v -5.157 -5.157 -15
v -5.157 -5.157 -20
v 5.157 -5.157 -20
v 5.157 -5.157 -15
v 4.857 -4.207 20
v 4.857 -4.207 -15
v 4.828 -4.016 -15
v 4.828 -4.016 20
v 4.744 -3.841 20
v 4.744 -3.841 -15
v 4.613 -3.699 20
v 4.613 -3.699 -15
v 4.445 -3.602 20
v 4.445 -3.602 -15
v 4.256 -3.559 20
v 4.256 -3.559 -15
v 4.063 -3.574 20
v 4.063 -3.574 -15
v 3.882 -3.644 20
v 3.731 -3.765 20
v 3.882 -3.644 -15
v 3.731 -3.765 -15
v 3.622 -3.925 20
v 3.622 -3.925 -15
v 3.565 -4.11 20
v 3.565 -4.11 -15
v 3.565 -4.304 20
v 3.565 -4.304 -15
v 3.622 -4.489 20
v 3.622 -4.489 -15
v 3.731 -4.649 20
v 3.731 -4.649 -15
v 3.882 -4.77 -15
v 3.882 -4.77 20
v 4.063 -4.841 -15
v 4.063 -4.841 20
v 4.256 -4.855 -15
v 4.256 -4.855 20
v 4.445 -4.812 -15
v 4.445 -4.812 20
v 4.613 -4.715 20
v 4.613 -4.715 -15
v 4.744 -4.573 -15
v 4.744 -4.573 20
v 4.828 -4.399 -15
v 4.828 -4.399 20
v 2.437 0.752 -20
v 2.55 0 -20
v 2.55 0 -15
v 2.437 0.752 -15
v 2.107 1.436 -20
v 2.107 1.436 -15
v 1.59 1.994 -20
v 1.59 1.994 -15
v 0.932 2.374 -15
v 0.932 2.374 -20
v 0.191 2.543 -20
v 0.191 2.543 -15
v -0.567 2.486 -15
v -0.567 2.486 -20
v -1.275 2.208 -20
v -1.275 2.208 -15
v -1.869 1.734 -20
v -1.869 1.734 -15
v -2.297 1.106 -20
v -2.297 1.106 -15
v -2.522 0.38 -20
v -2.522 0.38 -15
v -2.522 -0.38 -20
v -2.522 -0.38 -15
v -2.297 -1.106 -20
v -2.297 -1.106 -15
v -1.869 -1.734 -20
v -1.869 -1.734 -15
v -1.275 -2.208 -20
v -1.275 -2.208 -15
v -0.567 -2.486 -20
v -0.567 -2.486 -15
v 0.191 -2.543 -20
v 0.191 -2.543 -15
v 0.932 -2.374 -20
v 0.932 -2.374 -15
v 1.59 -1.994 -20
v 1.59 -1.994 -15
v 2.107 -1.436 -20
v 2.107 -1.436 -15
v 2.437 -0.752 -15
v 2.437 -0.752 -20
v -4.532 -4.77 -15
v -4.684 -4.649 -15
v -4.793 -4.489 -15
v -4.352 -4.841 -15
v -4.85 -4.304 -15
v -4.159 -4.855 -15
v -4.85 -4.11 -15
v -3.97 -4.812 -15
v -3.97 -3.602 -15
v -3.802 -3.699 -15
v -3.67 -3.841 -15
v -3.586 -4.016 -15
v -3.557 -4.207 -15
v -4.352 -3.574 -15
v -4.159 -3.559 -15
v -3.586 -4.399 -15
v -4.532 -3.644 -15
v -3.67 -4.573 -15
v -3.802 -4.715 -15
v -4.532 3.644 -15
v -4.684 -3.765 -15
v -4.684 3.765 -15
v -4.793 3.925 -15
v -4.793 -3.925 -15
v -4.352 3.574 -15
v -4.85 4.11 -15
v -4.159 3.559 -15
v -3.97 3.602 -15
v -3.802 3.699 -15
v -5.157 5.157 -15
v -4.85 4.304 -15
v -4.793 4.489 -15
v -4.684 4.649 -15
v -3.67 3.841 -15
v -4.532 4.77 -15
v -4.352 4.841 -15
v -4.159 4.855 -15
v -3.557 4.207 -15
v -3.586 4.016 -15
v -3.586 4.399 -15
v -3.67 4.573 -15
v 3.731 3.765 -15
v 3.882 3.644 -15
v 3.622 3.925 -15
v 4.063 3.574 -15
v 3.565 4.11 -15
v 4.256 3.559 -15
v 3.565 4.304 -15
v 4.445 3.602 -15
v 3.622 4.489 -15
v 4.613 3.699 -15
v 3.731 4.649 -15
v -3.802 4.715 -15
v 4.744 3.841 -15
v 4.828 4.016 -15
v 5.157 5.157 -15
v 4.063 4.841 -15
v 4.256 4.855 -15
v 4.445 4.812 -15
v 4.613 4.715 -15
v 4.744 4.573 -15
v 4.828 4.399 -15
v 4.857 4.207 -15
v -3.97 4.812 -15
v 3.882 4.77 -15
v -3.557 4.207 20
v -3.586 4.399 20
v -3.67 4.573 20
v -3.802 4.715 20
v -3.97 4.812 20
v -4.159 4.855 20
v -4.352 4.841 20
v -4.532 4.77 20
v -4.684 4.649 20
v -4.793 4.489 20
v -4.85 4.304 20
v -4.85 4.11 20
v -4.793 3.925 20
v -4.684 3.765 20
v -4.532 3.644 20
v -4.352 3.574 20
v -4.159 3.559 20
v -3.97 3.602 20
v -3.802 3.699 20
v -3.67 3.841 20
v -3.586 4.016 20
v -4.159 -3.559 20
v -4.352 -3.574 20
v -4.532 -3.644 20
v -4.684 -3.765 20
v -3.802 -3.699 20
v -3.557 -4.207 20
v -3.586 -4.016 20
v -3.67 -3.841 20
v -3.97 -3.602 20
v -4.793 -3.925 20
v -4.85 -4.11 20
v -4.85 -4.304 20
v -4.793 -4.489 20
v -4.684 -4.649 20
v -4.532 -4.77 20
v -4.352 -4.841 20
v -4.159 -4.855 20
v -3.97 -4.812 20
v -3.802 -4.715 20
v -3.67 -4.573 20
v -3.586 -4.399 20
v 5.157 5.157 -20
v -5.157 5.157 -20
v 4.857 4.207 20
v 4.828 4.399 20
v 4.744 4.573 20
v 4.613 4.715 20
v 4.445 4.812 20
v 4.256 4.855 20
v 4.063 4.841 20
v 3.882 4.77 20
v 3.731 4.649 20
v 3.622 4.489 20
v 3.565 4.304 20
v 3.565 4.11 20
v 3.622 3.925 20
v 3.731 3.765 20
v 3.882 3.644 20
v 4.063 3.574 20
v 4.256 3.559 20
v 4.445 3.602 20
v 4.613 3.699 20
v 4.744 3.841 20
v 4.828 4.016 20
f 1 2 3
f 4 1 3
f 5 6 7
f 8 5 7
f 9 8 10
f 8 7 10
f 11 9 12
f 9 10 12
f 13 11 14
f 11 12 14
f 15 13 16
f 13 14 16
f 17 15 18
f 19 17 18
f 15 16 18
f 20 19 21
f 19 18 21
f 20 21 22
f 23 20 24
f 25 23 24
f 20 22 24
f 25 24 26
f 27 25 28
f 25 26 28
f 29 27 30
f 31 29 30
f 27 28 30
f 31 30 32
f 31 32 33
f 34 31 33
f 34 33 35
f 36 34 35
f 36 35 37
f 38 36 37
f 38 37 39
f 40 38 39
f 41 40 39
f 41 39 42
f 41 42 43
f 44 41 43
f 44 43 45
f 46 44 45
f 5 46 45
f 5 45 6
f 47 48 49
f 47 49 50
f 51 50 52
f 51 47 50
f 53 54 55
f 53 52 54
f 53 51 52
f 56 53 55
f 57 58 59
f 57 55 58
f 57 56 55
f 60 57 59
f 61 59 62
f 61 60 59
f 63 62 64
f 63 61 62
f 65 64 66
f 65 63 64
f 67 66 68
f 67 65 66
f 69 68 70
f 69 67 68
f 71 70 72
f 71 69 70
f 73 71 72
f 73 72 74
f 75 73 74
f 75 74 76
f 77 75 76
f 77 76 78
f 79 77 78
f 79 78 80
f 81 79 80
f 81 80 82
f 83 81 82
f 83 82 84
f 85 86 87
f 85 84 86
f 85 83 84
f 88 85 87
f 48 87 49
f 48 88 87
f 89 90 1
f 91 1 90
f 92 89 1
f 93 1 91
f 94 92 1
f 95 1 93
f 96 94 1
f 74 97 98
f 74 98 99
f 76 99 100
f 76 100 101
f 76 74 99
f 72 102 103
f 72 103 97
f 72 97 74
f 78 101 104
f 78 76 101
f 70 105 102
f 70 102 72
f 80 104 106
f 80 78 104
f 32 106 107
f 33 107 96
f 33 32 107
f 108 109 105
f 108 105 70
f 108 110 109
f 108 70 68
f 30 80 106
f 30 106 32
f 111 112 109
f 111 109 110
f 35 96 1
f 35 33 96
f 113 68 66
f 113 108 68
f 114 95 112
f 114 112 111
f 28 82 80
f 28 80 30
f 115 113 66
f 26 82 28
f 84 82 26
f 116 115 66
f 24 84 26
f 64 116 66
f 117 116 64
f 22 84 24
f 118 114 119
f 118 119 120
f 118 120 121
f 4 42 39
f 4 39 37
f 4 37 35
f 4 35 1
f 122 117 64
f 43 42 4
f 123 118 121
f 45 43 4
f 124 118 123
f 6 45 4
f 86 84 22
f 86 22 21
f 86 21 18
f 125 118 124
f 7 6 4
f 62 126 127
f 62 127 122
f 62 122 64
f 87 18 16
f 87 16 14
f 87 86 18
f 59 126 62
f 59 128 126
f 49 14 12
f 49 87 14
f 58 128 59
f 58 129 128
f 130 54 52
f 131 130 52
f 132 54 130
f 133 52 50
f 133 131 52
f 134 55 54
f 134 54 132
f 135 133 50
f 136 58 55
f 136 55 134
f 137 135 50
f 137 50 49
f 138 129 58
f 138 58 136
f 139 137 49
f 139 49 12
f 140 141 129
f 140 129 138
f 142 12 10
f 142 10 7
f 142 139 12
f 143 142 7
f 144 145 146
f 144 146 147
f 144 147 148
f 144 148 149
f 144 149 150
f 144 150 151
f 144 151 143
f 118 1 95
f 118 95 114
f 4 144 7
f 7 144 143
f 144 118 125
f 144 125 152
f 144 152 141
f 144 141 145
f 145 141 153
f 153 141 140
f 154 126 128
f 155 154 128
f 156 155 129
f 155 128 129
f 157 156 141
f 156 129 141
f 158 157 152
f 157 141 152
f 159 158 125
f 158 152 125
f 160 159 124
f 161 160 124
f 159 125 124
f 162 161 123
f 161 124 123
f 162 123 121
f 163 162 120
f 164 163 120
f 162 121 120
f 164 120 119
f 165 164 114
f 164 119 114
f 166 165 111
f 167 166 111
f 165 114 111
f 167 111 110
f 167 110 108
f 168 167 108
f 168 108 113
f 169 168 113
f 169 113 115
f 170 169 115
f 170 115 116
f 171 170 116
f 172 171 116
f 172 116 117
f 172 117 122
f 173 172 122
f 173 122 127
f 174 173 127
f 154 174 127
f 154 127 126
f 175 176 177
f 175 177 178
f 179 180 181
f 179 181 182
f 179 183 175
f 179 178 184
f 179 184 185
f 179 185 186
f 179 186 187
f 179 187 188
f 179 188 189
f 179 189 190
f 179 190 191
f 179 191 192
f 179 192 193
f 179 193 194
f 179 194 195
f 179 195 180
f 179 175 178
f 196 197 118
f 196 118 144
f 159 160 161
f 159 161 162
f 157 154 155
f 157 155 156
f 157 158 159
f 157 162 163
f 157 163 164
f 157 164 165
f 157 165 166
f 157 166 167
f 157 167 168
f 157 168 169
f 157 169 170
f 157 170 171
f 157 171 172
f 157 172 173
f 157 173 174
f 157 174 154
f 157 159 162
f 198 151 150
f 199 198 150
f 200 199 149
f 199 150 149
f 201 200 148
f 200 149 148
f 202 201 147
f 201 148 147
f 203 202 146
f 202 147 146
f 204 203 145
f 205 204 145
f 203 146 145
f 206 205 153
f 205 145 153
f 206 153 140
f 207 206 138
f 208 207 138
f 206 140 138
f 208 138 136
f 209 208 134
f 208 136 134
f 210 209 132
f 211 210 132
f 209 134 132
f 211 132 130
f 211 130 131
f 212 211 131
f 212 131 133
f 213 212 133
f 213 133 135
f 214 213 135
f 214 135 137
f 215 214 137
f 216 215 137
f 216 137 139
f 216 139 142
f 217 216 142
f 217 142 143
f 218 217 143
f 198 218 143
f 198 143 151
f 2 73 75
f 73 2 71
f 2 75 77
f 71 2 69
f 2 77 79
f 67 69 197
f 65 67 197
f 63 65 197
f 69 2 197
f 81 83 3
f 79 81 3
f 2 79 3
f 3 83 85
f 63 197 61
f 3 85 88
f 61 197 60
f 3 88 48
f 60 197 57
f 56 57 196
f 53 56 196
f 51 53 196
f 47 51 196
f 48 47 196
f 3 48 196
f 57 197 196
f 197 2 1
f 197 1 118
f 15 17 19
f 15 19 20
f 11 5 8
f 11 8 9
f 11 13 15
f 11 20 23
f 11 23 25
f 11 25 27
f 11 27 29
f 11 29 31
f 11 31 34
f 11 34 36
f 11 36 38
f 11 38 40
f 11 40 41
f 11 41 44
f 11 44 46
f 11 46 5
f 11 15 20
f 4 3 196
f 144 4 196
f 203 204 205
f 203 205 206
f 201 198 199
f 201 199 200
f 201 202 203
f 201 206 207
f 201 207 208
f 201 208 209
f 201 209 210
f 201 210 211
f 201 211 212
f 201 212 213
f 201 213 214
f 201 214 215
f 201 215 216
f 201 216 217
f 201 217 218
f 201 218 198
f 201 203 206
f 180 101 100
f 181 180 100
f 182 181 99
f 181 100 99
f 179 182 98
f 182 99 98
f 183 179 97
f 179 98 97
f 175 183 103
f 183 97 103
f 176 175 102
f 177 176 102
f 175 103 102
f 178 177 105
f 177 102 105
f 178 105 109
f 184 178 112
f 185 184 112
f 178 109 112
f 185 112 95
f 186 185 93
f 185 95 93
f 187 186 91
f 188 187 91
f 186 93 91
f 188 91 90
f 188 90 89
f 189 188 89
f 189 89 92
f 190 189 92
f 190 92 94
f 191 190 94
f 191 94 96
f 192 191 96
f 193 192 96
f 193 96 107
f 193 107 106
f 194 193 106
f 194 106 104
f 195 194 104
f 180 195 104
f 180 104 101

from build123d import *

# Parameters (mm, degrees)
MAINBODY_EXTRUDE_START = -20
PROJECTIONXY_SKETCH_W  = 10.314570696
PROJECTIONXY_SKETCH_H  = 10.314570696
MAINBODY_EXTRUDE_DEPTH = 5
BORE_CUT_DEPTH         = 22.28838144
BORE_CUT_DEPTH_BACK    = 22.28838144
BORE_SKETCH_R          = 2.55
POSTS_EXTRUDE_START    = -20
POSTS_SKETCH_R         = 0.65
POSTS_EXTRUDE_DEPTH    = 40


with BuildPart() as part:
    # projectionXy_sketch → mainBody_extrude (new body)
    with BuildSketch(Plane.XY.offset(MAINBODY_EXTRUDE_START)):
        Rectangle(PROJECTIONXY_SKETCH_W, PROJECTIONXY_SKETCH_H)
    extrude(amount=MAINBODY_EXTRUDE_DEPTH)

    # bore_sketch → bore_cut (cut, two sides: drawn at the far end of the back side and taken through both)
    with BuildSketch(Plane.XY.offset(-BORE_CUT_DEPTH_BACK)):
        Circle(BORE_SKETCH_R)
    extrude(amount=BORE_CUT_DEPTH + BORE_CUT_DEPTH_BACK, mode=Mode.SUBTRACT)

    # posts_sketch → posts_extrude (add)
    with BuildSketch(Plane.XY.offset(POSTS_EXTRUDE_START)):
        with Locations((4.207285348, -4.207285348)):
            Circle(POSTS_SKETCH_R)
        with Locations((-4.207285348, -4.207285348)):
            Circle(POSTS_SKETCH_R)
        with Locations((-4.207285348, 4.207285348)):
            Circle(POSTS_SKETCH_R)
        with Locations((4.207285348, 4.207285348)):
            Circle(POSTS_SKETCH_R)
    extrude(amount=POSTS_EXTRUDE_DEPTH)


solid = part.part
